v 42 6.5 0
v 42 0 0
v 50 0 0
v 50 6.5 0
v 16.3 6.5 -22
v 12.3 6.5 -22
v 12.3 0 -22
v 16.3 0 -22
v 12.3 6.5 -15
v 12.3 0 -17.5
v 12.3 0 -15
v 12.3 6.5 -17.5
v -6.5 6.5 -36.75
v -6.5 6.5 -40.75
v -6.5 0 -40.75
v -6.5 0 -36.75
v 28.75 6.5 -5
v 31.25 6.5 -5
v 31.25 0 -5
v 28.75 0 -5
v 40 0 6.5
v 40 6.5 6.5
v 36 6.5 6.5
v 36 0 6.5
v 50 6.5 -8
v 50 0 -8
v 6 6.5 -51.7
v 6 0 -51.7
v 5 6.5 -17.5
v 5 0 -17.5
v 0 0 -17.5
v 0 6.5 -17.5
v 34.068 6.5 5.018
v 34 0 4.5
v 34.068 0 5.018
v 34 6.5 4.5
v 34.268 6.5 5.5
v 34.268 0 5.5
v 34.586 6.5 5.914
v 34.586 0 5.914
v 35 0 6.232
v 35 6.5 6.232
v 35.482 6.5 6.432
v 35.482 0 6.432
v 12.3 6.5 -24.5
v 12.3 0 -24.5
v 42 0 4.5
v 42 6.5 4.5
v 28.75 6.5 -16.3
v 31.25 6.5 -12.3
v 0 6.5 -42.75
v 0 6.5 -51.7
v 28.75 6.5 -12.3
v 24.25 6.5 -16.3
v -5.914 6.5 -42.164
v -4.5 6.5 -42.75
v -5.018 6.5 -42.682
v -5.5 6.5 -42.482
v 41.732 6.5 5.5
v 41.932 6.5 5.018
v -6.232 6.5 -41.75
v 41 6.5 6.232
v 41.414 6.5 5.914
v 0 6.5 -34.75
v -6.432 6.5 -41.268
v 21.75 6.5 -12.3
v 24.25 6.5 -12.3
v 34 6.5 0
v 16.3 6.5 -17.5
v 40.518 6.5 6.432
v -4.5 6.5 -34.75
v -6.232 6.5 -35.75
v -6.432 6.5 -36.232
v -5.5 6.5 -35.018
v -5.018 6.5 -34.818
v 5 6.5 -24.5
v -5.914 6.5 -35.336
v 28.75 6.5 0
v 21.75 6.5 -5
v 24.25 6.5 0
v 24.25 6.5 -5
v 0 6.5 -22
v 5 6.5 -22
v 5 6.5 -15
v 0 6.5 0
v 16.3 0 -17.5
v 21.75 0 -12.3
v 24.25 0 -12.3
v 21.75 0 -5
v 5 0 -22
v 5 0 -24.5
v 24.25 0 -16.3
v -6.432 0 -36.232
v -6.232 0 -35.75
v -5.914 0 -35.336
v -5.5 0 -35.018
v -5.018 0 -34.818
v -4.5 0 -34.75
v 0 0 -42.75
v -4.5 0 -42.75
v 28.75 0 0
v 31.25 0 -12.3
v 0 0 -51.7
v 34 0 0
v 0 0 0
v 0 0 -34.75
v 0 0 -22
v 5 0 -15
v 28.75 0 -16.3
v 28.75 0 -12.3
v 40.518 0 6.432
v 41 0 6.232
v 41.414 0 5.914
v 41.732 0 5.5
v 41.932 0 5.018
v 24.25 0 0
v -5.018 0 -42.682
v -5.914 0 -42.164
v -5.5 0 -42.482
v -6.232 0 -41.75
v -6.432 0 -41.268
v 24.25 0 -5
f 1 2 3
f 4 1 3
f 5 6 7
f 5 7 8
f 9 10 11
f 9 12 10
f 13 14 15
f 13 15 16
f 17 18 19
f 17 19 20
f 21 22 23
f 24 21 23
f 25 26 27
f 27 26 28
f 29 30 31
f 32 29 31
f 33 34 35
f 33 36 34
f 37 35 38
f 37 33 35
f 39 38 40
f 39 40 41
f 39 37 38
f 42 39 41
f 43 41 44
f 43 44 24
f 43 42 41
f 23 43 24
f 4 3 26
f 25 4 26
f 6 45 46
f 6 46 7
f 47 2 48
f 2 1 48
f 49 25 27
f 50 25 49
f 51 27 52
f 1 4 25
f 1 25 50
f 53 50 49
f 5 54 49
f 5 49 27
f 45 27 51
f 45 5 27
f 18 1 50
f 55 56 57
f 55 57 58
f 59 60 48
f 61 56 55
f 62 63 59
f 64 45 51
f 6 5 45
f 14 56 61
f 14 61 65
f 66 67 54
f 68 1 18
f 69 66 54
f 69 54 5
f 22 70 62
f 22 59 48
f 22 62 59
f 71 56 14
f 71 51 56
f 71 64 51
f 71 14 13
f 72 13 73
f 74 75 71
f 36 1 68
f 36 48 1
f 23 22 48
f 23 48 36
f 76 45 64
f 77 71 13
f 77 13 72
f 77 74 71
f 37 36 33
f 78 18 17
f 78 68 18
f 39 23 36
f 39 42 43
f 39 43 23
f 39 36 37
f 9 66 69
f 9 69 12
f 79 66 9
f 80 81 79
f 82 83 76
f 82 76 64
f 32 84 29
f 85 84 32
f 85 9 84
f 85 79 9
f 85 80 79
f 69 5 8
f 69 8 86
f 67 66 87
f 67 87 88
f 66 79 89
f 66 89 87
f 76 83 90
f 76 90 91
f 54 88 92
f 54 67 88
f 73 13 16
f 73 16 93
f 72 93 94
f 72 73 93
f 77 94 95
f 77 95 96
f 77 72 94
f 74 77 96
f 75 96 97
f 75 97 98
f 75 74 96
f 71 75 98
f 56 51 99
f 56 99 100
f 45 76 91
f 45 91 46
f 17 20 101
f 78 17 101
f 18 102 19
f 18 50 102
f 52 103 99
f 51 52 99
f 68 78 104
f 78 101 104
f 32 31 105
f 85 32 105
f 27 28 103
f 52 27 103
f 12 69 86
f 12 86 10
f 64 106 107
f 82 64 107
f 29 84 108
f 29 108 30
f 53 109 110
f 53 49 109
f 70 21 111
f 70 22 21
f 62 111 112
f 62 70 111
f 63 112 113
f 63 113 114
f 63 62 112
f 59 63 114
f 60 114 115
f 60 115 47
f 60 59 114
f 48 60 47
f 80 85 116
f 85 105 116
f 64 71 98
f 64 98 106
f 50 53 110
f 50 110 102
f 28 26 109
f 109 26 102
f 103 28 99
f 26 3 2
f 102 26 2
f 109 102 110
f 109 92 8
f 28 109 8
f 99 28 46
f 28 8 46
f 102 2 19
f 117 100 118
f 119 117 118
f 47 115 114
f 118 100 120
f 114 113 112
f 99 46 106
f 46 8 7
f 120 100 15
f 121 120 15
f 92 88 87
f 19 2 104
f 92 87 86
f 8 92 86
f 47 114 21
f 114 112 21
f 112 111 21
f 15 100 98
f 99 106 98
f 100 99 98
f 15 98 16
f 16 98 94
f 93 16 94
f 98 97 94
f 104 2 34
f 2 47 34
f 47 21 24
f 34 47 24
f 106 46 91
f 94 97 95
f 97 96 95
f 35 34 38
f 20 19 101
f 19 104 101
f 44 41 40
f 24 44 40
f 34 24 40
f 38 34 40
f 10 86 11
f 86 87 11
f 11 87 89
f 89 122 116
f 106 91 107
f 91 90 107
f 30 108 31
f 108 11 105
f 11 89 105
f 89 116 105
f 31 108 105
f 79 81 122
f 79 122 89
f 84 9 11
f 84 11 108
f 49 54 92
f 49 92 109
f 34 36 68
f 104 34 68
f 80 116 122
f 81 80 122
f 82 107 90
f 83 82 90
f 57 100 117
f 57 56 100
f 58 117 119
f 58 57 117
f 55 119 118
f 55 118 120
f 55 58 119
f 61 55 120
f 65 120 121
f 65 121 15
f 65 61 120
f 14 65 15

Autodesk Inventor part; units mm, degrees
ref_plane "YZ Plane" through (0, 0, 0) normal (1, 0, 0) x (0, 1, 0)
ref_plane "XZ Plane" through (0, 0, 0) normal (0, 1, 0) x (-1, 0, 0)
ref_plane "XY Plane" through (0, 0, 0) normal (0, 0, 1) x (1, 0, 0)
sketch "Sketch1" plane through (0, 0, 0) normal (0, 1, 0) x (-1, 0, 0)
  line L0 (0, -51.7) -> (0, 0)
  line L1 (0, 0) -> (-50, 0)
  line L2 (-50, 0) -> (-50, -8)
  line L3 (-50, -8) -> (-6, -51.7)
  line L4 (-6, -51.7) -> (0, -51.7)
  dimension "d0" = 51.7
  dimension "d1" = 50
  dimension "d2" = 8
  dimension "d3" = 6
extrude "Extrusion1" add sketch "Sketch1" along normal blind 6.5
sketch "Sketch2" plane through (0, 6.5, 0) normal (0, 1, 0) x (1, 0, 0)
  line L0 (0, 0) -> (50, 0) projected
  line L1 (50, 0) -> (50, 8) projected
  line L2 (34, 0) -> (42, 0)
  line L3 (42, 0) -> (42, -4.5)
  line L4 (40, -6.5) -> (36, -6.5)
  line L5 (34, -4.5) -> (34, 0)
  arc A0 (34, -4.5) -> (36, -6.5) centre (36, -4.5) ccw
  arc A1 (40, -6.5) -> (42, -4.5) centre (40, -4.5) ccw
  dimension "d6" = 2
  dimension "d7" = 8
  dimension "d8" = 6.5
  dimension "d9" = 8
extrude "Extrusion2" add sketch "Sketch2" against normal blind 6.5
sketch "Sketch3" plane through (0, 6.5, 0) normal (0, 1, 0) x (1, 0, 0)
  line L0 (0, 0) -> (34, 0) projected
  line L1 (34, 0) -> (34, -4.5) projected
  line L2 (24.25, 16.3) -> (28.75, 16.3)
  line L3 (28.75, 0) -> (24.25, 0)
  line L4 (31.25, 12.3) -> (31.25, 5)
  line L5 (21.75, 5) -> (21.75, 12.3)
  line L6 (21.75, 12.3) -> (24.25, 12.3)
  line L7 (28.75, 12.3) -> (31.25, 12.3)
  line L8 (24.25, 0) -> (24.25, 5)
  line L9 (24.25, 12.3) -> (24.25, 16.3)
  line L10 (31.25, 5) -> (28.75, 5)
  line L11 (24.25, 5) -> (21.75, 5)
  line L12 (28.75, 16.3) -> (28.75, 12.3)
  line L13 (28.75, 5) -> (28.75, 0)
  point P0 (26.5, 16.3)
  dimension "d12" = 4.5
  dimension "d13" = 5
  dimension "d14" = 7.3
  dimension "d15" = 4
  dimension "d16" = 2.5
  dimension "d17" = 7.5
extrude "Extrusion3" cut sketch "Sketch3" against normal through all
sketch "Sketch4" plane through (0, 6.5, 0) normal (0, 1, 0) x (1, 0, 0)
  line L0 (0, 51.7) -> (0, 0) projected
  line L1 (0, 0) -> (24.25, 0) projected
  line L2 (16.3, 22) -> (16.3, 17.5)
  line L3 (0, 17.5) -> (0, 22)
  line L4 (5, 24.5) -> (12.3, 24.5)
  line L5 (12.3, 15) -> (5, 15)
  line L6 (0, 22) -> (5, 22)
  line L7 (12.3, 22) -> (16.3, 22)
  line L8 (16.3, 17.5) -> (12.3, 17.5)
  line L9 (5, 17.5) -> (0, 17.5)
  line L10 (5, 15) -> (5, 17.5)
  line L11 (5, 22) -> (5, 24.5)
  line L12 (12.3, 24.5) -> (12.3, 22)
  line L13 (12.3, 17.5) -> (12.3, 15)
  point P0 (16.3, 19.75)
  dimension "d20" = 4.5
  dimension "d21" = 5
  dimension "d22" = 4
  dimension "d23" = 7.3
  dimension "d24" = 19.75
  dimension "d25" = 2.5
extrude "Extrusion4" cut sketch "Sketch4" against normal through all
sketch "Sketch5" plane through (0, 6.5, 0) normal (0, 1, 0) x (1, 0, 0)
  line L0 (16.3, 22) -> (16.3, 17.5) projected
  line L1 (0, 51.7) -> (0, 22) projected
  line L2 (0, 42.75) -> (-4.5, 42.75)
  line L3 (-6.5, 40.75) -> (-6.5, 36.75)
  line L4 (-4.5, 34.75) -> (0, 34.75)
  line L5 (0, 34.75) -> (0, 42.75)
  arc A0 (-4.5, 42.75) -> (-6.5, 40.75) centre (-4.5, 40.75) ccw
  arc A1 (-6.5, 36.75) -> (-4.5, 34.75) centre (-4.5, 36.75) ccw
  point P0 (16.3, 19.75)
  dimension "d28" = 2
  dimension "d29" = 8
  dimension "d30" = 6.5
  dimension "d31" = 15
extrude "Extrusion5" add sketch "Sketch5" against normal blind 6.5
properties part number "x_carryage_brace_top"
